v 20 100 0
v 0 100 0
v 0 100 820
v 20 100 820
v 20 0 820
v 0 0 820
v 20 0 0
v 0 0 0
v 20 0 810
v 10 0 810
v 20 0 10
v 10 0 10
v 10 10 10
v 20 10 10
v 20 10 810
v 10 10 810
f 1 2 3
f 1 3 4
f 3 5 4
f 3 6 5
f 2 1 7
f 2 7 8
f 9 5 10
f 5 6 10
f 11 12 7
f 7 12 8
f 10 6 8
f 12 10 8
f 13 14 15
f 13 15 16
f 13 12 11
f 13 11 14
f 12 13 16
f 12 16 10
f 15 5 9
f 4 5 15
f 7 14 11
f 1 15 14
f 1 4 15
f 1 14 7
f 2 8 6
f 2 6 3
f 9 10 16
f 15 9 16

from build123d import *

# Parameters (mm, degrees)
EXTRUDE_1_DEPTH = 820
SKETCH_3_W      = 10
SKETCH_3_H      = 10
EXTRUDE_2_DEPTH = 10


with BuildPart() as part:
    # Эскиз1 → Бобышка-Вытянуть1 (new body)
    with BuildSketch(Plane.XY):
        Polygon((0, 0), (0, 100), (20, 100), (20, 10), (10, 10), (10, 0), align=None)
    extrude(amount=EXTRUDE_1_DEPTH)

    # Эскиз3 → Бобышка-Вытянуть2 (add)
    with BuildSketch(Plane(origin=(10, 0, 0), x_dir=(0, 0, -1), z_dir=(1, 0, 0))):
        with Locations((-815, 5)):
            Rectangle(SKETCH_3_W, SKETCH_3_H)
        with Locations((-5, 5)):
            Rectangle(SKETCH_3_W, SKETCH_3_H)
    extrude(amount=EXTRUDE_2_DEPTH)


solid = part.part
